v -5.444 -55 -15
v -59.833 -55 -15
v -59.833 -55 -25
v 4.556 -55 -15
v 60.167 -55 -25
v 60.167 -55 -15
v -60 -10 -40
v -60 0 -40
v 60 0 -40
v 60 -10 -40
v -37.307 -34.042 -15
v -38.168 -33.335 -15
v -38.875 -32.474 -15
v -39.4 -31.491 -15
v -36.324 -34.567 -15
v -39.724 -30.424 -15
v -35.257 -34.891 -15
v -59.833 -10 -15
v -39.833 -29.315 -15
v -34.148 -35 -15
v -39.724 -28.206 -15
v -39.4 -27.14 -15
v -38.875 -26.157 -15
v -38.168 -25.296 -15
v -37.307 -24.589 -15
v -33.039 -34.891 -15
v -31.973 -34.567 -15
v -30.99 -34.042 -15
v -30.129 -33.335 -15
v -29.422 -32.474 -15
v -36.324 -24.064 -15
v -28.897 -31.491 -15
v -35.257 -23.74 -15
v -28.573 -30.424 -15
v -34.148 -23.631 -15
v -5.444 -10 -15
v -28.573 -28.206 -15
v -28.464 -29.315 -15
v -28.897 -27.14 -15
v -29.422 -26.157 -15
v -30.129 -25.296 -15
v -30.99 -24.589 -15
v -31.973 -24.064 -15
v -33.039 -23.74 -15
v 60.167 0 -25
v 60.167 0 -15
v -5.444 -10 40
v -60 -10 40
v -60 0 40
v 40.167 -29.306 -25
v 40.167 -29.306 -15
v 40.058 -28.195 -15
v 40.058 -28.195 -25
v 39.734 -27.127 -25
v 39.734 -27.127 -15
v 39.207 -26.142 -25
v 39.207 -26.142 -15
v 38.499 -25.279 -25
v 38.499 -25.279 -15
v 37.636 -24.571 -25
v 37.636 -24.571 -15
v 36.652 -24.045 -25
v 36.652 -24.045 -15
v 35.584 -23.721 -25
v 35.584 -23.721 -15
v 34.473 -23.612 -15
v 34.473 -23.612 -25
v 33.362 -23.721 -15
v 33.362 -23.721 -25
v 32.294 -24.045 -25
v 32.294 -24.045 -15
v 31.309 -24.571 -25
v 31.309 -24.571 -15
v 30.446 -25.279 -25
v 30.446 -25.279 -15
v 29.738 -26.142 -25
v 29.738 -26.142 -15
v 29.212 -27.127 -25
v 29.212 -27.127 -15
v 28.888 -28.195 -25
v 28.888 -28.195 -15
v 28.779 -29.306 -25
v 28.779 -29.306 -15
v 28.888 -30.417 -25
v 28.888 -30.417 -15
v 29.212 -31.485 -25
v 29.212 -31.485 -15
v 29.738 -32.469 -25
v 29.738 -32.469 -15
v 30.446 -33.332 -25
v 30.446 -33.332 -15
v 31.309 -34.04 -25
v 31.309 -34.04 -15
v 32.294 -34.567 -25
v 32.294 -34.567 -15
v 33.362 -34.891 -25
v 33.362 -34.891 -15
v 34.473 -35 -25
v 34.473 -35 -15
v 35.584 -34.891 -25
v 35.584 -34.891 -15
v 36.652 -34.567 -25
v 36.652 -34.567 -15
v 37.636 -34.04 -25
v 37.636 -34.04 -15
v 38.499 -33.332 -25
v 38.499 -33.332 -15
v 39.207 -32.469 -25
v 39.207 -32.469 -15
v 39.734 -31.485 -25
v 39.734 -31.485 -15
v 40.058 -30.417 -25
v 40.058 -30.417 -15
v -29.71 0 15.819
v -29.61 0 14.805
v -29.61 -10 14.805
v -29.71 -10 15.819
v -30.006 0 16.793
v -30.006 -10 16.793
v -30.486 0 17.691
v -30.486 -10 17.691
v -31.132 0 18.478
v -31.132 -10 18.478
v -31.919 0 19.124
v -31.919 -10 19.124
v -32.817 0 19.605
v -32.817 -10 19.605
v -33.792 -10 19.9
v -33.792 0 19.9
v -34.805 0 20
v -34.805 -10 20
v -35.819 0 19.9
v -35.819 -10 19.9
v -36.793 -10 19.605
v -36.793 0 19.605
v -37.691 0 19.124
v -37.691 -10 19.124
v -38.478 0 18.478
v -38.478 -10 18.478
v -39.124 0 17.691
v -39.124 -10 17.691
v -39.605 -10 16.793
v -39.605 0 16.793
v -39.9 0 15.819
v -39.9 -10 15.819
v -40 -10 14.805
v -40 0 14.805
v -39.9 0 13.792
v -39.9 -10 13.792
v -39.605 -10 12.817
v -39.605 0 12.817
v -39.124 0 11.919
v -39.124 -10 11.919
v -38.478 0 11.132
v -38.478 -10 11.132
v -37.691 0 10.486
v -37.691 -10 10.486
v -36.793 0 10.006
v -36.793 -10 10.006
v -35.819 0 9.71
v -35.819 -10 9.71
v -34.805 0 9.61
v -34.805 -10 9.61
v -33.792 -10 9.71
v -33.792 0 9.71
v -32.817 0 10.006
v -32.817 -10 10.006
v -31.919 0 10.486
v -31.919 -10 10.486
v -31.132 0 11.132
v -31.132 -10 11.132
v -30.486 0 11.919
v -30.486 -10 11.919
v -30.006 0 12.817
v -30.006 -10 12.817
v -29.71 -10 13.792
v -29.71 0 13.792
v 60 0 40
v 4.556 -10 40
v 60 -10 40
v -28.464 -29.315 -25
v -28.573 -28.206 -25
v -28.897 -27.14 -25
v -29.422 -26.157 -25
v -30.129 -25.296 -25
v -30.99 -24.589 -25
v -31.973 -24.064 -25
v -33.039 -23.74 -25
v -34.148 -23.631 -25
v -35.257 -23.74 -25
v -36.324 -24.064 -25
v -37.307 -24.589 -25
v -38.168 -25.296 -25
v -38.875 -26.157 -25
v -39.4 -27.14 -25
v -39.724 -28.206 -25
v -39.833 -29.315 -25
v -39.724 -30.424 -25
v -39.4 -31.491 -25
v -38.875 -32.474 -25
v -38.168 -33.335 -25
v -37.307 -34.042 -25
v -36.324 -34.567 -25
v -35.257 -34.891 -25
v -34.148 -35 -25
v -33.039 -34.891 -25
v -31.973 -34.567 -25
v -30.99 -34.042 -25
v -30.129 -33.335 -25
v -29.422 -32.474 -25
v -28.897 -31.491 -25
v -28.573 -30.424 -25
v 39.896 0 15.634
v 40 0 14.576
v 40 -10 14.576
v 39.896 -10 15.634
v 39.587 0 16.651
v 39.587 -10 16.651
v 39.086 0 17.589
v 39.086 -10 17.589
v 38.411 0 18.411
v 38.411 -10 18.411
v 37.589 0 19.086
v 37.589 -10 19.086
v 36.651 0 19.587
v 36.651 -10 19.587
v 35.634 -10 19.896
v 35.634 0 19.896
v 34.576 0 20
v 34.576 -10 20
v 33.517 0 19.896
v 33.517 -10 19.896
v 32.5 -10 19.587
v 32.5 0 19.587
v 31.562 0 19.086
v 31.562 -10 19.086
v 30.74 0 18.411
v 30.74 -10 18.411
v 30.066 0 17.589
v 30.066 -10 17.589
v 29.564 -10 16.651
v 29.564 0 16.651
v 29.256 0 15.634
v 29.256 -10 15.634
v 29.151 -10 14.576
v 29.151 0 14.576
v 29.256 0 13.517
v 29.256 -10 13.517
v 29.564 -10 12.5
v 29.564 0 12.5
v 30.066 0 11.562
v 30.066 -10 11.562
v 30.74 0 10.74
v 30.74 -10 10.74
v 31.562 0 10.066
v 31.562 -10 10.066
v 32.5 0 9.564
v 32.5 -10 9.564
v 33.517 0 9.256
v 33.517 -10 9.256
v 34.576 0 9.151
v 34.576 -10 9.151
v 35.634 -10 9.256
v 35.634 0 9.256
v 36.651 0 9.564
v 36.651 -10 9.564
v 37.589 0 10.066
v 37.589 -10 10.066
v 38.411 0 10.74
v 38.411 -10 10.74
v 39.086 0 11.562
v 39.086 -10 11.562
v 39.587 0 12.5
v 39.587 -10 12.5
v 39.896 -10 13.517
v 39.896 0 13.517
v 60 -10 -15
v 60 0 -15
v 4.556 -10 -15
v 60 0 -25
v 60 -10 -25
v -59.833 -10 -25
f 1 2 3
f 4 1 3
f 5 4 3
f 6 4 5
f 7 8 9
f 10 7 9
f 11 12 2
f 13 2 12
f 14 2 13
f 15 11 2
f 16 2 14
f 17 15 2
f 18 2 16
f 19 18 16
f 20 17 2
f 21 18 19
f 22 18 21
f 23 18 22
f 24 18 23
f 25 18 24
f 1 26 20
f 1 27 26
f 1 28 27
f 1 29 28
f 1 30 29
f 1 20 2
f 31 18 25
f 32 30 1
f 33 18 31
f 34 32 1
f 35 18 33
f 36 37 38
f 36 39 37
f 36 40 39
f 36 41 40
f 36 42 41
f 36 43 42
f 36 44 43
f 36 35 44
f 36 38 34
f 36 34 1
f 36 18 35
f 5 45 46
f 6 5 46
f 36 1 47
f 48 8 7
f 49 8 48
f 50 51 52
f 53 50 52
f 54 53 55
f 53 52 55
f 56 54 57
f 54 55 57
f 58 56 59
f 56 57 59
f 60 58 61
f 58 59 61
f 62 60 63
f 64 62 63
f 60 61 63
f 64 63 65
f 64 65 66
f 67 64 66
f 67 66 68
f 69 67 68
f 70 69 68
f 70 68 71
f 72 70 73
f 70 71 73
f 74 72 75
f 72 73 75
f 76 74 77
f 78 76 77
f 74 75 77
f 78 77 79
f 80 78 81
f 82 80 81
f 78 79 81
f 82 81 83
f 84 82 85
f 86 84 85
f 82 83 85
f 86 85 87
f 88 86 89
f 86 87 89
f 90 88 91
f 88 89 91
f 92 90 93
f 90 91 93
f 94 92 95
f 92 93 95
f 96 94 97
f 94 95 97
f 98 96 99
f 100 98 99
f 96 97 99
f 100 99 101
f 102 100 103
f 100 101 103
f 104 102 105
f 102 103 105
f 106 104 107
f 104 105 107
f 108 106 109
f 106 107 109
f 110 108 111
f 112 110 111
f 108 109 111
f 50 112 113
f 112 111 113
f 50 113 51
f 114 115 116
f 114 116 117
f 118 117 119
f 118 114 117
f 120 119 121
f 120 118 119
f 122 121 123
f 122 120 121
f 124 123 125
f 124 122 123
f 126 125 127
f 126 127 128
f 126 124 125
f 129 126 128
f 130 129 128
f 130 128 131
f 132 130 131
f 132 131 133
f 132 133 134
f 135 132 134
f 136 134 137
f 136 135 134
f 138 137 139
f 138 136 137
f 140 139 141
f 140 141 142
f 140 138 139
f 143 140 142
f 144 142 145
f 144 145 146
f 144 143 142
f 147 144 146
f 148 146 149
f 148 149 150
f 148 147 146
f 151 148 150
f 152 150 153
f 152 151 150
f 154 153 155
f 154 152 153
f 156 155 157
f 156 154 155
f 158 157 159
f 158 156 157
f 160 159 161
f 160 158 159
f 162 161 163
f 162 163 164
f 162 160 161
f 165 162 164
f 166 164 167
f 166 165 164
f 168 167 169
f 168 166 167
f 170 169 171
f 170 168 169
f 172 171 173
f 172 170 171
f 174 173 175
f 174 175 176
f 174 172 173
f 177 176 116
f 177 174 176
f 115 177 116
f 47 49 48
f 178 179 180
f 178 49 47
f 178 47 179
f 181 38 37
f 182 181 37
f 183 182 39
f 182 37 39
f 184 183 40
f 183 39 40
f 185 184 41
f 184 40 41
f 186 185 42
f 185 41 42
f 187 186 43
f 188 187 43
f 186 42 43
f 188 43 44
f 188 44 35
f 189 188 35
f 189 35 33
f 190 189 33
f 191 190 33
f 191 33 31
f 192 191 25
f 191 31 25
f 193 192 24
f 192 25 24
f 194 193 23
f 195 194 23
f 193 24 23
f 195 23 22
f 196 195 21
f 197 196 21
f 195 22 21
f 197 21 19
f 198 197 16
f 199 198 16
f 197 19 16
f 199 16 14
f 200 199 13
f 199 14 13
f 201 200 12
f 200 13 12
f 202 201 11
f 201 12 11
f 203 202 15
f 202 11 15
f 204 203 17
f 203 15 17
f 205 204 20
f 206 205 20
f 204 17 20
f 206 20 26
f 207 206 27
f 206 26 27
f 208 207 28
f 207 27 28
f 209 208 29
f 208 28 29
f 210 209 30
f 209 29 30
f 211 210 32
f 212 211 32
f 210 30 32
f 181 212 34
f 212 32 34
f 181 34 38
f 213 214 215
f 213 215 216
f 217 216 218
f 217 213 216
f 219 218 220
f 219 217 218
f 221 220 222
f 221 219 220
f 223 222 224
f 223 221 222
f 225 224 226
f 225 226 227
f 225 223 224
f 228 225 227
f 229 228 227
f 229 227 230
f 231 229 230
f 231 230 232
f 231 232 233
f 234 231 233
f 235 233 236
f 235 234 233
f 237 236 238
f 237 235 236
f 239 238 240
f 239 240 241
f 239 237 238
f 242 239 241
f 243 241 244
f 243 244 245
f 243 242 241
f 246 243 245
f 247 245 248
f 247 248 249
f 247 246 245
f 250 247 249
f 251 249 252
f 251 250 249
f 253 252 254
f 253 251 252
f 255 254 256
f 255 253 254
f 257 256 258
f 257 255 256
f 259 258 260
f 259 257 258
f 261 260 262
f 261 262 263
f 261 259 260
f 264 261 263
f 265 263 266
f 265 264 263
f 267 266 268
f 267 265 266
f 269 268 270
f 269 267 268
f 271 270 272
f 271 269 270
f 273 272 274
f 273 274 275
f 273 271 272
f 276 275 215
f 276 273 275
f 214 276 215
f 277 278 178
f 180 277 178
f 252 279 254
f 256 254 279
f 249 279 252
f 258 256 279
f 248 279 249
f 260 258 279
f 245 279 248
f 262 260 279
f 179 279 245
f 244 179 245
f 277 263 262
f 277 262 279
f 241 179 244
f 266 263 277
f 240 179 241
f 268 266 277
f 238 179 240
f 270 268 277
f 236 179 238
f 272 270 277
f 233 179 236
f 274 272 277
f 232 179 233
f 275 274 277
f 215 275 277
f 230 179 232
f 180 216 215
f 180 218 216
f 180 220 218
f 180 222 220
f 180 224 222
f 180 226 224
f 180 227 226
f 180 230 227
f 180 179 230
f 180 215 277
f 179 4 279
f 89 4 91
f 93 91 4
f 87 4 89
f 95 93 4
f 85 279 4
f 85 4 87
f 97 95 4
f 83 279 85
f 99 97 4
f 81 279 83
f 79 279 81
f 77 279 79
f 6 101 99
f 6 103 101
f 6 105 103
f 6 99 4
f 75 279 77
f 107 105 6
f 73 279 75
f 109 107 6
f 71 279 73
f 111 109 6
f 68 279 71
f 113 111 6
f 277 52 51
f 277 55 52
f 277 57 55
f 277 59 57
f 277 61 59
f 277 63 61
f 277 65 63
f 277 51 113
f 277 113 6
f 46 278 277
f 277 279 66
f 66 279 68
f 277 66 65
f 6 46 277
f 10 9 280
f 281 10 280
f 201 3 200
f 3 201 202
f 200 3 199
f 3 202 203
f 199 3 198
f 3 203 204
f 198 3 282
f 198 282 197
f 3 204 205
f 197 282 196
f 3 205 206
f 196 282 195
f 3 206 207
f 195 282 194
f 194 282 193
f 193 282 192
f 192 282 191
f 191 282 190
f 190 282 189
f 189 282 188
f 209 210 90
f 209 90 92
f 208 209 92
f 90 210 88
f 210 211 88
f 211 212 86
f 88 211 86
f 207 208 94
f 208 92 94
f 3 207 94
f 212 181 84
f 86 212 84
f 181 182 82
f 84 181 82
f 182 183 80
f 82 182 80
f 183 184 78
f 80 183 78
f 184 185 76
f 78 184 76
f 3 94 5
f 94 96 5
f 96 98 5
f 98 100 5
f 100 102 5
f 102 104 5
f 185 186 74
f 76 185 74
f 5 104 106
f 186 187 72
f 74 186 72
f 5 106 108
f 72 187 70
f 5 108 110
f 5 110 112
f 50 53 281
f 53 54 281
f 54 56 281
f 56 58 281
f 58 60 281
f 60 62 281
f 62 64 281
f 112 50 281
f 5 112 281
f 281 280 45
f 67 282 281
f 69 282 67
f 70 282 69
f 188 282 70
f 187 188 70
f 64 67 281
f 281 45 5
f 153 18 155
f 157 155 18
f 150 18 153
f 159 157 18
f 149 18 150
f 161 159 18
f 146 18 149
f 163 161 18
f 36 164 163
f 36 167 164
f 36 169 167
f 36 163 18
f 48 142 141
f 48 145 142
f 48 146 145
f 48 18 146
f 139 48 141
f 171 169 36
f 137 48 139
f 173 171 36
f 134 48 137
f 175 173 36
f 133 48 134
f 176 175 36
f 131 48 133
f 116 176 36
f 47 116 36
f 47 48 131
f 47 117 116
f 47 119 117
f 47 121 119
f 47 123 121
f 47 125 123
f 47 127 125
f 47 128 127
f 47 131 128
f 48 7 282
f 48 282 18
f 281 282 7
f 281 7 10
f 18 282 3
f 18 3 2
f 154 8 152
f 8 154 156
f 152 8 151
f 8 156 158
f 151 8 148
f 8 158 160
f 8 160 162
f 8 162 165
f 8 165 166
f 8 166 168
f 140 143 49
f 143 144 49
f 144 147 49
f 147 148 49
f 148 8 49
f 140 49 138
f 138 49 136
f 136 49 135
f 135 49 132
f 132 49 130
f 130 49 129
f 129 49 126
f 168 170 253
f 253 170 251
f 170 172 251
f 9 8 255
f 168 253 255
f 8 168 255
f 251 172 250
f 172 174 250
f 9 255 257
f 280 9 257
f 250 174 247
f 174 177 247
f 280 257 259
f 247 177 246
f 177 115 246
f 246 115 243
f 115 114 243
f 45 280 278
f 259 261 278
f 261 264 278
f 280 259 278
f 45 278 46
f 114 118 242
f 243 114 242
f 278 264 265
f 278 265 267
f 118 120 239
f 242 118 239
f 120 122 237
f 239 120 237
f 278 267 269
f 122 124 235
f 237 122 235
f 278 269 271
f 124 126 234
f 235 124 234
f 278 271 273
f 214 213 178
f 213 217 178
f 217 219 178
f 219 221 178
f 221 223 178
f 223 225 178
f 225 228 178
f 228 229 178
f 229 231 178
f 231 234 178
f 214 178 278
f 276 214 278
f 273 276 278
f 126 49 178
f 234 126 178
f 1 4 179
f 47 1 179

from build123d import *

# Parameters (mm, degrees)
F0_W     = 120
F0_H     = 80
F0_R     = 5.19491
F0_R_2   = 5.424314
F1_DEPTH = 10
F2_W     = 120
F2_H     = 10
F3_DEPTH = 55
F4_R     = 5.684537
F4_R_2   = 5.694204
F5_DEPTH = 10
F6_W     = 10
F6_H     = 45
F7_DEPTH = 55
F9_DEPTH = 25


with BuildPart() as f1:
    # F0 (on Front) → F1 (new body)
    with BuildSketch(Plane.XZ):
        Rectangle(F0_W, F0_H)
        with Locations((-34.80509, 14.80509)):
            Circle(F0_R, mode=Mode.SUBTRACT)
        with Locations((34.575686, 14.575686)):
            Circle(F0_R_2, mode=Mode.SUBTRACT)
    extrude(amount=F1_DEPTH)

    # F2 (on Front) → F3 (join)
    with BuildSketch(Plane.XZ):
        with Locations((0.167052, -20)):
            Rectangle(F2_W, F2_H)
    extrude(amount=F3_DEPTH)

    # F4 (on face) → F5 (cut)
    with BuildSketch(Plane.XY.offset(-15)):
        with Locations((-34.148411, -29.315463)):
            Circle(F4_R)
        with Locations((34.472848, -29.305796)):
            Circle(F4_R_2)
    extrude(amount=-F5_DEPTH, mode=Mode.SUBTRACT)

    # F6 (on face) → F7 (join)
    with BuildSketch(Plane.XY.offset(-15)):
        with Locations((-0.443549, -32.5)):
            Rectangle(F6_W, F6_H)
    extrude(amount=F7_DEPTH)

    # F8 (on face) → F9 (cut)
    with BuildSketch(Plane.YZ.offset(4.556451)):
        Polygon((-55, -15), (-10, 40), (-55, 40), align=None)
    extrude(amount=-F9_DEPTH, mode=Mode.SUBTRACT)


solid = f1.part
